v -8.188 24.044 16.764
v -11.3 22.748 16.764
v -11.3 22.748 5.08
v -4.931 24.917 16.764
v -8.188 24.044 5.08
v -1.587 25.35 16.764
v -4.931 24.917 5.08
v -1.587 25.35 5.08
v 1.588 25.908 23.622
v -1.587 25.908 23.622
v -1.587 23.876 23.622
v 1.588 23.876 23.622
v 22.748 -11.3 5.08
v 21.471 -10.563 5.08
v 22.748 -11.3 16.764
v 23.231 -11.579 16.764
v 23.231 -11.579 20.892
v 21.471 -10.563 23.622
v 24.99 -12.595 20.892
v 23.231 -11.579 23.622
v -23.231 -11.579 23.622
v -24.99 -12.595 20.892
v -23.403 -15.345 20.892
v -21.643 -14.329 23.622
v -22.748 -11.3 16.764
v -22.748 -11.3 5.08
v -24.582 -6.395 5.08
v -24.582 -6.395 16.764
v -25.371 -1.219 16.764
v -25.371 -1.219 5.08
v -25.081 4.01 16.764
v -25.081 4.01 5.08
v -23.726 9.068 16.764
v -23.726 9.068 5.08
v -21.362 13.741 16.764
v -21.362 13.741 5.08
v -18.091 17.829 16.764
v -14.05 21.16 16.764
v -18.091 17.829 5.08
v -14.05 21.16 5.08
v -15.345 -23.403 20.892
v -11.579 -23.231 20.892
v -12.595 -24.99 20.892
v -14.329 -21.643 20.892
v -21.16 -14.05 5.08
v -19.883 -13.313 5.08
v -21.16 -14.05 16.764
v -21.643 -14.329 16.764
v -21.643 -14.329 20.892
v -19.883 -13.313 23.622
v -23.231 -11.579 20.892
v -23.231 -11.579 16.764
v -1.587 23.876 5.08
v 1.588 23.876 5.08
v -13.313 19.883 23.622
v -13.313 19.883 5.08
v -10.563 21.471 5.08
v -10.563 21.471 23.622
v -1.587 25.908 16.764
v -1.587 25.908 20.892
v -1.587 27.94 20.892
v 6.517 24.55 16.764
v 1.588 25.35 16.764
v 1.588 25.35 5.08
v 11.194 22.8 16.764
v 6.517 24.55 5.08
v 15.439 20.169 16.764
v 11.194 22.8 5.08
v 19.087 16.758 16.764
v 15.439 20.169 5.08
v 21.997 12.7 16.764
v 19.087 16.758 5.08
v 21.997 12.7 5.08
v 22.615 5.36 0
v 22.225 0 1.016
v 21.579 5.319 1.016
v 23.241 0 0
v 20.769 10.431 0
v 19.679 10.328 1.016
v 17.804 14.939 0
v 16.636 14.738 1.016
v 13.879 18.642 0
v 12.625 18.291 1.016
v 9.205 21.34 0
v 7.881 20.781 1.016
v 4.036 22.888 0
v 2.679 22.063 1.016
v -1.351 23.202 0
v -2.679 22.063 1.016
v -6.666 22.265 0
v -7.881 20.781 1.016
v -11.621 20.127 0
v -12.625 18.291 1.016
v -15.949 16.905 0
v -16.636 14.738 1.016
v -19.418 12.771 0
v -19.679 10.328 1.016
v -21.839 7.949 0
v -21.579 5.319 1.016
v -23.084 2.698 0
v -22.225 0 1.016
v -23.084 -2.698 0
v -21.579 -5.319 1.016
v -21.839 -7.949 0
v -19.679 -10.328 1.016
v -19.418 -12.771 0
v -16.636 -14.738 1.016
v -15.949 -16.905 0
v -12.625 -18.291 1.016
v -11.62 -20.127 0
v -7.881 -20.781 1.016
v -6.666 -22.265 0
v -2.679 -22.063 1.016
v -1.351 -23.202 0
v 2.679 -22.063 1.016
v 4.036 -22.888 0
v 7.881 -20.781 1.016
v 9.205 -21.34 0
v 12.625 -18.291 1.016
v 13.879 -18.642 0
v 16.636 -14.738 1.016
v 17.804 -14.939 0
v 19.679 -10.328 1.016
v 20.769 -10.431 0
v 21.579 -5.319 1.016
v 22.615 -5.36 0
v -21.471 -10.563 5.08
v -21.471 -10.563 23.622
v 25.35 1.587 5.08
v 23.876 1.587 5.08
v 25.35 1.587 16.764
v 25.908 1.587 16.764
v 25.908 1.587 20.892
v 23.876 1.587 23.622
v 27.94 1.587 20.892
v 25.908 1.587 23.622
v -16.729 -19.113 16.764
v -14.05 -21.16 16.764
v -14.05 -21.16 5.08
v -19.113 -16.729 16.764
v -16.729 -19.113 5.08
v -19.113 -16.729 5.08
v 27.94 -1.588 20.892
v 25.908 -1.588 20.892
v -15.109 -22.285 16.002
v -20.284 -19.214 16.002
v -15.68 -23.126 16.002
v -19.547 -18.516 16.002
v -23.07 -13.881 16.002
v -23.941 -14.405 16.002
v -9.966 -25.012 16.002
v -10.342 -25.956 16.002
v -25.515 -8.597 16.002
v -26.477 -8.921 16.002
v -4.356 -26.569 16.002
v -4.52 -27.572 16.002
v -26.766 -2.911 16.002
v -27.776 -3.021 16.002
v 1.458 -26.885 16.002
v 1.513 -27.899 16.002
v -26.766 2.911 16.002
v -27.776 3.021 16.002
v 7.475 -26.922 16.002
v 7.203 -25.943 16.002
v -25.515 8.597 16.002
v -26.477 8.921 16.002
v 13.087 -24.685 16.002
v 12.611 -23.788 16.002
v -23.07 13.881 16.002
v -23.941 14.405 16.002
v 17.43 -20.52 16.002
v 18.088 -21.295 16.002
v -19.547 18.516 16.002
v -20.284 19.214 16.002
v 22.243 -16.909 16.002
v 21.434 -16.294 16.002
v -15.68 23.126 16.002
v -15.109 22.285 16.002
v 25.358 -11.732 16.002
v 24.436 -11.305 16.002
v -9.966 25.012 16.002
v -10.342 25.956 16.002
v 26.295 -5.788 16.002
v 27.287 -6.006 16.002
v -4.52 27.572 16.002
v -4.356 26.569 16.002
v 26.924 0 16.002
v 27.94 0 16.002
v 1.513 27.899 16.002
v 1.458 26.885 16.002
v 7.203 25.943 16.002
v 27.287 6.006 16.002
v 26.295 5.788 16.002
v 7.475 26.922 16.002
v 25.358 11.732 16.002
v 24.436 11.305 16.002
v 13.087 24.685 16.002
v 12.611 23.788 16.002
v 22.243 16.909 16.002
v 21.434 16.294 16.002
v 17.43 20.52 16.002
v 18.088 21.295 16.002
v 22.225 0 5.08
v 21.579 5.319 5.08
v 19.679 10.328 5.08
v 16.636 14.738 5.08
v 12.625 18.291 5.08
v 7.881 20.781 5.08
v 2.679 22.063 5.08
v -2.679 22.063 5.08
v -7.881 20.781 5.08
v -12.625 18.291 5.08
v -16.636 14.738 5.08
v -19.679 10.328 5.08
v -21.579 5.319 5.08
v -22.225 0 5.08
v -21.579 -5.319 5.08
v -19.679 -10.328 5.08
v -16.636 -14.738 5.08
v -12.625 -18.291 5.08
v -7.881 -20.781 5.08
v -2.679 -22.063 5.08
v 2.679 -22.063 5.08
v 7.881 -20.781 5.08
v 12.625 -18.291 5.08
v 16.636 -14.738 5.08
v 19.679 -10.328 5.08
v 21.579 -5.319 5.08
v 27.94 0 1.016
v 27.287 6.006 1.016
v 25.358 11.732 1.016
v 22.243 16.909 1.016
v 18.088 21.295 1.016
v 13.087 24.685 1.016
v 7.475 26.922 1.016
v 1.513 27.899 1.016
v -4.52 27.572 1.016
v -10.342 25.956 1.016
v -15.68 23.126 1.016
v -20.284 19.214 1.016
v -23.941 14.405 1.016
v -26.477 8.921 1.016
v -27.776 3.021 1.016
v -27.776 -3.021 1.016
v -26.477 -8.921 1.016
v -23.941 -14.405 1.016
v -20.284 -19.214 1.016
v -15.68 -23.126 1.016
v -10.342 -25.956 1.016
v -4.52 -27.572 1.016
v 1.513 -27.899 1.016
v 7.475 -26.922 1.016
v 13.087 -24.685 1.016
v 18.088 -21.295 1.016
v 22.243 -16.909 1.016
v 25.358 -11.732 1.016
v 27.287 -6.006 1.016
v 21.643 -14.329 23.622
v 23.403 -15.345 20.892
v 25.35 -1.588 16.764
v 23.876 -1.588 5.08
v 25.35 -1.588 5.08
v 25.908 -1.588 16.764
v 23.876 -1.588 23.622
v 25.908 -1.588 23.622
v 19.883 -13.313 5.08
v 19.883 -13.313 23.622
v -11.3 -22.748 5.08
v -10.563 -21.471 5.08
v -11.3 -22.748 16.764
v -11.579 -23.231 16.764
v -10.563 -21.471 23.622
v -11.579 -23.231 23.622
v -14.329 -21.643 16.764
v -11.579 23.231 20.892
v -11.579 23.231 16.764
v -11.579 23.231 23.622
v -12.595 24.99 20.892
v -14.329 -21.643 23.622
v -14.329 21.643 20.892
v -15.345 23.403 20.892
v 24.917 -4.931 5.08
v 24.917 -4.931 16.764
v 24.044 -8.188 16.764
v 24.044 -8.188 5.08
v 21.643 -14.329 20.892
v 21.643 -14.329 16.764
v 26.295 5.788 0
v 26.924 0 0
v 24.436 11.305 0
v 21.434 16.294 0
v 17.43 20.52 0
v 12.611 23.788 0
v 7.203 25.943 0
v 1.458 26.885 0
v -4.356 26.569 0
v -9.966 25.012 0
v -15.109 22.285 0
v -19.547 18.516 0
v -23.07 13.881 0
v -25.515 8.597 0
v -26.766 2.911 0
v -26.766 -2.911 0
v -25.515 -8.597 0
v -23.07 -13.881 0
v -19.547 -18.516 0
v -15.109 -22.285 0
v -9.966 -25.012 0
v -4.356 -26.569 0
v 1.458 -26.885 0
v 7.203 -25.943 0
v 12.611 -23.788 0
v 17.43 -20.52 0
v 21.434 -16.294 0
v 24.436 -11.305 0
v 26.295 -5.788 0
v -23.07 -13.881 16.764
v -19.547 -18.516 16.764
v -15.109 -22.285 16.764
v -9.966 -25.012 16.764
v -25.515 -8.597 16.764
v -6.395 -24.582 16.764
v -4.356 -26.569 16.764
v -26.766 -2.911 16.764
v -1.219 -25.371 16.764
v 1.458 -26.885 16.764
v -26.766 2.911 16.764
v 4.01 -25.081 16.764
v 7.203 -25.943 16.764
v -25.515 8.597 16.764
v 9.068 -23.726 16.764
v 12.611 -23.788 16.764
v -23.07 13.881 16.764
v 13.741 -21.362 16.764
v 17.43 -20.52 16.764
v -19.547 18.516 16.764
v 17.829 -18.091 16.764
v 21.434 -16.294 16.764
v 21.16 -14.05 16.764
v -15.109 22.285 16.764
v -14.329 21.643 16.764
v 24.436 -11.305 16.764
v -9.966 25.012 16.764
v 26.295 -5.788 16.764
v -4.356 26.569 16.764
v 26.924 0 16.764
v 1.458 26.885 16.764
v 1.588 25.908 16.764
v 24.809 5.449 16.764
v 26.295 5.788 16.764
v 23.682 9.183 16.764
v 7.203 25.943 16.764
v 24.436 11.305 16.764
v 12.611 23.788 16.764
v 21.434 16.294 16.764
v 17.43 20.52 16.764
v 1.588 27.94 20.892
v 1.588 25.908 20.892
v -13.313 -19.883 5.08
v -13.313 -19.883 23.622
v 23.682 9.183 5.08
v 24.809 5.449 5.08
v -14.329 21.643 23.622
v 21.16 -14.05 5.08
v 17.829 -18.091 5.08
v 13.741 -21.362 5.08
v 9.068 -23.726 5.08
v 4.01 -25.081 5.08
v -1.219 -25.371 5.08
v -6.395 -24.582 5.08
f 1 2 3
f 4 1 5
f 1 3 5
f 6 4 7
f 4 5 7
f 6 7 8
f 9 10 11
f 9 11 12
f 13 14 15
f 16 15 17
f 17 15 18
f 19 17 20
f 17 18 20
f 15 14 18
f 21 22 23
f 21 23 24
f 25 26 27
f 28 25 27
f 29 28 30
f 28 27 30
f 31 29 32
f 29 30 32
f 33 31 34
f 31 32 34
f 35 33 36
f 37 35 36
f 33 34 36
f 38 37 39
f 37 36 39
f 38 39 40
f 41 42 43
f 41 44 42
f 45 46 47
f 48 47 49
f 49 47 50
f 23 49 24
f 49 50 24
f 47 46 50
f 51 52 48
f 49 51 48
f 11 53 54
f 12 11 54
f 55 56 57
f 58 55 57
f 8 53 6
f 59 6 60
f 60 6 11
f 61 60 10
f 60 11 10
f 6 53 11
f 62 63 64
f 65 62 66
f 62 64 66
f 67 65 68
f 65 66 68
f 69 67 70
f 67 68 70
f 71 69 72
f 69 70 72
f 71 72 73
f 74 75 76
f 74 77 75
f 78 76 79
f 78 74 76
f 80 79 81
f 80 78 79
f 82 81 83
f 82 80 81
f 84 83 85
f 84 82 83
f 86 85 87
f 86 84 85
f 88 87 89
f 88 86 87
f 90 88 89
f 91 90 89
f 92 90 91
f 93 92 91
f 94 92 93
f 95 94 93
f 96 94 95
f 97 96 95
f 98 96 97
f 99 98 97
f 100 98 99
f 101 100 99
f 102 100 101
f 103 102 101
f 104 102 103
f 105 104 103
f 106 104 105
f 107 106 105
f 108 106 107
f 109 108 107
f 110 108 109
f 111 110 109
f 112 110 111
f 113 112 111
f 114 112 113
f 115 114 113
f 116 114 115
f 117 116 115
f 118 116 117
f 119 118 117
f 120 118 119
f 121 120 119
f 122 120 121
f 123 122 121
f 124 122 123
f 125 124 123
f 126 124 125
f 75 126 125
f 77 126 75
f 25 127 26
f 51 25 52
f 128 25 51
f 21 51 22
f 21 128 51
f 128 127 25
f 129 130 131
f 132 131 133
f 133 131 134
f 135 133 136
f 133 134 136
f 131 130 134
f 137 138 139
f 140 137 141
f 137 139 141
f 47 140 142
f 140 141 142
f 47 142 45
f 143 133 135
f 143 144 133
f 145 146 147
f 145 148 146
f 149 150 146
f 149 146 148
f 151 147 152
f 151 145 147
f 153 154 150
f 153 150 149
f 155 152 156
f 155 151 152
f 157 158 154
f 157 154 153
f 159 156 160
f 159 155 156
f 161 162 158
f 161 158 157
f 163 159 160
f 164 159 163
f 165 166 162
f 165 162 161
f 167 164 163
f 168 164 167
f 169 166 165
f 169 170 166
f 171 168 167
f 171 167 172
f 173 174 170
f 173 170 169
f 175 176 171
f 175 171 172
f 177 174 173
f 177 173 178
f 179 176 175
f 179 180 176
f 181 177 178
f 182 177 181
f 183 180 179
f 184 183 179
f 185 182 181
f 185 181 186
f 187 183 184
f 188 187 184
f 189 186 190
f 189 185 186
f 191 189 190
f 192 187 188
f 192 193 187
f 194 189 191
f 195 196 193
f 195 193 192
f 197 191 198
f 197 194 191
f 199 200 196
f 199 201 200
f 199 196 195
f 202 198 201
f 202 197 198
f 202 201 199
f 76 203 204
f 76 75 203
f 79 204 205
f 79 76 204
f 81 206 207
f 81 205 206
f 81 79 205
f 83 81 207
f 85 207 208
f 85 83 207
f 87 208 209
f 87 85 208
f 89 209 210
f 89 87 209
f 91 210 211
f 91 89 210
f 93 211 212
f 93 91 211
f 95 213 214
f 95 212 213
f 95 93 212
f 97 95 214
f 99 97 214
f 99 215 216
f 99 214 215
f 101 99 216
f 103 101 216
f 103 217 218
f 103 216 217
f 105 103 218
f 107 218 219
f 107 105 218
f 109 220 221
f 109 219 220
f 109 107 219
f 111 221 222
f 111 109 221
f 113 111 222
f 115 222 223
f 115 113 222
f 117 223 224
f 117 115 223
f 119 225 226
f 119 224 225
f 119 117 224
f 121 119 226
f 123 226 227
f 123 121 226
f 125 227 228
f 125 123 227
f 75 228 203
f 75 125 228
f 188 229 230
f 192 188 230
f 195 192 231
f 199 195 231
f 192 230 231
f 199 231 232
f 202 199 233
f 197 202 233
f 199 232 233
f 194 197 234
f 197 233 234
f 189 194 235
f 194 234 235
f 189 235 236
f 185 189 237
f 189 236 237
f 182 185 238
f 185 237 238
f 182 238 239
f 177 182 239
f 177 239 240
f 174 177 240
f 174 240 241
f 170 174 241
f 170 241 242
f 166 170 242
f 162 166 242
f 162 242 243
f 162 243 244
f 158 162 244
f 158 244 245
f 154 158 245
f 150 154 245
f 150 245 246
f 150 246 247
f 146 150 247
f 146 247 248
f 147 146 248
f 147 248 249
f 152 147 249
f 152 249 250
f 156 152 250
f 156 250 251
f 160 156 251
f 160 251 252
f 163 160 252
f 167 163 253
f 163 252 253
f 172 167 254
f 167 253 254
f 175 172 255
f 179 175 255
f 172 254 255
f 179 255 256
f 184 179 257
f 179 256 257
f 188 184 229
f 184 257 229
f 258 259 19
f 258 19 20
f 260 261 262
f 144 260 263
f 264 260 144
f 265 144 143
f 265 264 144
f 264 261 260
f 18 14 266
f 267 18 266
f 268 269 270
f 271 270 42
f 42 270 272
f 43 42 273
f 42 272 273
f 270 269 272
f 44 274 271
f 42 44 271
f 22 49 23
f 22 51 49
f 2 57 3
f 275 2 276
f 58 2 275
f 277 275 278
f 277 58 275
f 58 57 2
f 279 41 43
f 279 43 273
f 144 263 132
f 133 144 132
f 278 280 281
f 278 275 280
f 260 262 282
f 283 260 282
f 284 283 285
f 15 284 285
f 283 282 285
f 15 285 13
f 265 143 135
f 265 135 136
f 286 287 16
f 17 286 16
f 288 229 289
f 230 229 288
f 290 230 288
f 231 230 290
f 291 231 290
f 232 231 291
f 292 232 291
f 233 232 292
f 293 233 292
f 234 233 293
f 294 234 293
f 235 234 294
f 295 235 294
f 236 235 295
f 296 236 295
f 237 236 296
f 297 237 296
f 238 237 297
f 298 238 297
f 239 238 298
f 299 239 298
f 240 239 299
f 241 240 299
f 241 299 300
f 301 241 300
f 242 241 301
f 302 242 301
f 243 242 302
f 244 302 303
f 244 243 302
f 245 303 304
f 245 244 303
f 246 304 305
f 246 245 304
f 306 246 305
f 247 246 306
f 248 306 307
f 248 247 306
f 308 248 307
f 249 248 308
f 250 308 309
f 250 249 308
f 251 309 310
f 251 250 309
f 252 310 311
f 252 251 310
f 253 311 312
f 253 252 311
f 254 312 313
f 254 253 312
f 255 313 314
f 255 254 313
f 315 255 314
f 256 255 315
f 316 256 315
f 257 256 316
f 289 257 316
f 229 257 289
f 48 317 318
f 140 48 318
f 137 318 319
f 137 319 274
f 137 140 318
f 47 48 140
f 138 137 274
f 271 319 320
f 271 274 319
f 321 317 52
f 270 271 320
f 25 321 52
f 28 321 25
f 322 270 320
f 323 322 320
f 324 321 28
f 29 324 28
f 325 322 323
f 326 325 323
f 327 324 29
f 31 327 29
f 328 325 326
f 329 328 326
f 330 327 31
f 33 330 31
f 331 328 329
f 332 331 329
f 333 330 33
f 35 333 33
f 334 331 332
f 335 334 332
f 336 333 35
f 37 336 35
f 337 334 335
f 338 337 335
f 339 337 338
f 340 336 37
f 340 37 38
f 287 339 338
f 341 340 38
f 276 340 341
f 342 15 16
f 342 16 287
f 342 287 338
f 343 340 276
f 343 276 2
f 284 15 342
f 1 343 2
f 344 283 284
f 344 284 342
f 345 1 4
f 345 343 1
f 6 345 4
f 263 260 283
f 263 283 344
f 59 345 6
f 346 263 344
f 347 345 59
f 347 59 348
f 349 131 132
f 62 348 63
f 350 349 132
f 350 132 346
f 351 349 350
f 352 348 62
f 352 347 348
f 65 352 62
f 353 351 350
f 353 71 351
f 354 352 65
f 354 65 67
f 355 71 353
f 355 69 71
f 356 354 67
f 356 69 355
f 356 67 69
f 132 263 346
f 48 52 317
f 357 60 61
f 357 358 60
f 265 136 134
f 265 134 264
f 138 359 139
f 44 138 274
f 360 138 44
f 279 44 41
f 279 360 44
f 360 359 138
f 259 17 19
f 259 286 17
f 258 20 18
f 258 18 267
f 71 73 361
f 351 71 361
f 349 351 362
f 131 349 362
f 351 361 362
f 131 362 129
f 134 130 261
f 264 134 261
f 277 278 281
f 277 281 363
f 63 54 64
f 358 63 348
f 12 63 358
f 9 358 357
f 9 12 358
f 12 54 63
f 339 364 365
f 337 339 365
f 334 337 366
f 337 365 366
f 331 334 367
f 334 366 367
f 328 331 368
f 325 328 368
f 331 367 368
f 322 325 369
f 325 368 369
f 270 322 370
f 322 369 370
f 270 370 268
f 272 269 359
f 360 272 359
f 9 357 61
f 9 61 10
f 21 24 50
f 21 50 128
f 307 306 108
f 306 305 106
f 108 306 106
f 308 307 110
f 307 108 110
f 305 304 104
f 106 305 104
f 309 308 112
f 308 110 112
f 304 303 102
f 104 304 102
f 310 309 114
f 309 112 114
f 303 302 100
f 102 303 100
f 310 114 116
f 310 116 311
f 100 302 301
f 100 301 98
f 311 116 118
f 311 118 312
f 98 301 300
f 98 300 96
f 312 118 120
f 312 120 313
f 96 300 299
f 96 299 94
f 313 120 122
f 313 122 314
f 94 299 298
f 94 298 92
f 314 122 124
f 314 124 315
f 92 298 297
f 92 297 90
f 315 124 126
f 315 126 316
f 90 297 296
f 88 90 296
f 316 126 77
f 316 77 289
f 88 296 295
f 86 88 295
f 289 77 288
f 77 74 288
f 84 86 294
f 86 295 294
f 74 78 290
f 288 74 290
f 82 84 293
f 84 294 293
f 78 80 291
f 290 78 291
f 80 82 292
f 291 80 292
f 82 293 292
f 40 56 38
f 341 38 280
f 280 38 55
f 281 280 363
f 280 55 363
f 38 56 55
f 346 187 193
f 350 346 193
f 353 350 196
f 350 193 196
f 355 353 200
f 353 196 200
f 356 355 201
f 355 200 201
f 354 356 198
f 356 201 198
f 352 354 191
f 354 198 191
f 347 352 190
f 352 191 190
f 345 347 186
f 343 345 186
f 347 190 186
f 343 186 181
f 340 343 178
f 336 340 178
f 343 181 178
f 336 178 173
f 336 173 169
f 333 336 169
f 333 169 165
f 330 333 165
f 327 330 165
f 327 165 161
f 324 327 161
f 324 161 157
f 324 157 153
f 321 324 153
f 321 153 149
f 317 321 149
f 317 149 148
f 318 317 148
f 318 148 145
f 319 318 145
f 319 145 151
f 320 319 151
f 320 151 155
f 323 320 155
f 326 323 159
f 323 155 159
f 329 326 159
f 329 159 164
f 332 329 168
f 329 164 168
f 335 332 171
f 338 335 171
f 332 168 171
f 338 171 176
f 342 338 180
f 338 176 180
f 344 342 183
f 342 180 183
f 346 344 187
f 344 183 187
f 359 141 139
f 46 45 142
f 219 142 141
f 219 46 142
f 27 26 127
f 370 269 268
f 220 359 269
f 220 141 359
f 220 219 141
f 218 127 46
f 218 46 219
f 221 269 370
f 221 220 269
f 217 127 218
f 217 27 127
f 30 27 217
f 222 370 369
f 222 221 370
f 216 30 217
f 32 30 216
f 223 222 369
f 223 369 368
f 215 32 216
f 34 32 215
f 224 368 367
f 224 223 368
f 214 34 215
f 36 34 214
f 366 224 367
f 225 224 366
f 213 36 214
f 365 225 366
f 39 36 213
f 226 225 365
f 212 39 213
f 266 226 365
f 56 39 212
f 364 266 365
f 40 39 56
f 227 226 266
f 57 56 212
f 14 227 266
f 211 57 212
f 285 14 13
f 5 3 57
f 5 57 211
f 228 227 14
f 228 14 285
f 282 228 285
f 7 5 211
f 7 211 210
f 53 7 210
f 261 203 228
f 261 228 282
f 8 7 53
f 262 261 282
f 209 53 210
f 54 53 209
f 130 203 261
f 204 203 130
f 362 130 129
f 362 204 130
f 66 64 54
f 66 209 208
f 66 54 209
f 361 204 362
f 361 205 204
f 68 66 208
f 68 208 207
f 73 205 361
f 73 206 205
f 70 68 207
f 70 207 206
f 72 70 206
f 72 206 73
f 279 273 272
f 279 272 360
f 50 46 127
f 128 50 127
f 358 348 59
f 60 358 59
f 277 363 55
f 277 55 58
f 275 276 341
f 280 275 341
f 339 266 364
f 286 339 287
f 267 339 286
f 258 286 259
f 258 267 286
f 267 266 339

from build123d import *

# Parameters (mm, degrees)
F0_R      = 26.924
F1_DEPTH  = 16.764
F0_R_2    = 27.94
F2_DEPTH  = 16.002
F0_R_3    = 22.225
F3_DEPTH  = 5.08
F4_SIZE   = 1.016
F0_W      = 3.175
F0_H      = 1.016
F5_DEPTH  = 23.622
F7_DEPTH  = 1.5875
F8_COUNT  = 3
F9_COUNT  = 2
F9_ANGLE  = 30
F10_COUNT = 3


with BuildPart() as f1:
    # F0 (on Top) → F1 (new body)
    with BuildSketch(Plane.XY):
        Circle(F0_R)
        with BuildLine():
            ThreePointArc((1.5875, 25.3503420835), (18.5132722661, 17.3901912008), (25.4, 0))
            ThreePointArc((25.4, 0), (-17.3901912008, -18.5132722661), (-1.5875, 25.3503420835))
            Line((-1.5875, 25.3503420835), (-1.5875, 25.908))
            Line((-1.5875, 25.908), (1.5875, 25.908))
            Line((1.5875, 25.908), (1.5875, 25.3503420835))
        make_face(mode=Mode.SUBTRACT)
        with BuildLine():
            ThreePointArc((-1.5875, 25.3503420835), (0, 25.4), (1.5875, 25.3503420835))
            Line((1.5875, 25.3503420835), (1.5875, 25.908))
            Line((1.5875, 25.908), (-1.5875, 25.908))
            Line((-1.5875, 25.908), (-1.5875, 25.3503420835))
        make_face()
    extrude(amount=F1_DEPTH)

    # F0 (on Top) → F2 (join)
    with BuildSketch(Plane.XY):
        Circle(F0_R_2)
        Circle(F0_R, mode=Mode.SUBTRACT)
    extrude(amount=F2_DEPTH)

    # F0 (on Top) → F3 (join)
    with BuildSketch(Plane.XY):
        with BuildLine():
            Line((1.5875, 24.892), (1.5875, 25.3503420835))
            ThreePointArc((1.5875, 25.3503420835), (0, 25.4), (-1.5875, 25.3503420835))
            Line((-1.5875, 25.3503420835), (-1.5875, 24.892))
            Line((-1.5875, 24.892), (1.5875, 24.892))
        make_face()
        with BuildLine():
            ThreePointArc((-1.5875, 25.3503420835), (-17.3901912008, -18.5132722661), (25.4, 0))
            ThreePointArc((25.4, 0), (18.5132722661, 17.3901912008), (1.5875, 25.3503420835))
            Line((1.5875, 25.3503420835), (1.5875, 24.892))
            Line((1.5875, 24.892), (1.5875, 23.876))
            Line((1.5875, 23.876), (-1.5875, 23.876))
            Line((-1.5875, 23.876), (-1.5875, 24.892))
            Line((-1.5875, 24.892), (-1.5875, 25.3503420835))
        make_face()
        Circle(F0_R_3, mode=Mode.SUBTRACT)
    extrude(amount=F3_DEPTH)

    # F4
    f4_edges = [f1.edges().sort_by_distance(p)[0] for p in [
        (-27.94, 0, 0),
        (-22.225, 0, 0),
    ]]
    chamfer(f4_edges, length=F4_SIZE)

    # F0 (on Top) → F5 (join)
    with BuildSketch(Plane.XY):
        with BuildLine():
            ThreePointArc((-1.5875, 25.3503420835), (0, 25.4), (1.5875, 25.3503420835))
            Line((1.5875, 25.3503420835), (1.5875, 25.908))
            Line((1.5875, 25.908), (-1.5875, 25.908))
            Line((-1.5875, 25.908), (-1.5875, 25.3503420835))
        make_face()
        with BuildLine():
            Line((1.5875, 24.892), (1.5875, 25.3503420835))
            ThreePointArc((1.5875, 25.3503420835), (0, 25.4), (-1.5875, 25.3503420835))
            Line((-1.5875, 25.3503420835), (-1.5875, 24.892))
            Line((-1.5875, 24.892), (1.5875, 24.892))
        make_face()
        with Locations((0, 24.384)):
            Rectangle(F0_W, F0_H)
    extrude(amount=F5_DEPTH)

    # F6 (on Right) → F7 (join, symmetric)
    with BuildSketch(Plane.YZ):
        Polygon((25.908, 20.8915), (27.94, 20.8915), (25.908, 23.622), align=None)
    extrude(amount=F7_DEPTH, both=True)

    # F8: F1 ×3 about axis
    f8_axis = Axis((0, 0, 10.7297506183), (0, 0, 1))


with BuildPart() as f1_1:
    add(f1.part)
    for i in range(1, F8_COUNT):
        add(f1.part.rotate(f8_axis, i * 360 / F8_COUNT))

    # F9: F1 ×2 about axis
    f9_axis = Axis((0, 0, 10.7297506183), (0, 0, 1))


with BuildPart() as f1_2:
    add(f1_1.part)
    for i in range(1, F9_COUNT):
        add(f1_1.part.rotate(f9_axis, i * F9_ANGLE / (F9_COUNT - 1)))

    # F10: F1 ×3 about axis
    f10_axis = Axis((0, 0, 10.7297506183), (0, 0, 1))


with BuildPart() as f1_3:
    add(f1_2.part)
    for i in range(1, F10_COUNT):
        add(f1_2.part.rotate(f10_axis, i * 360 / F10_COUNT))


solid = f1_3.part
